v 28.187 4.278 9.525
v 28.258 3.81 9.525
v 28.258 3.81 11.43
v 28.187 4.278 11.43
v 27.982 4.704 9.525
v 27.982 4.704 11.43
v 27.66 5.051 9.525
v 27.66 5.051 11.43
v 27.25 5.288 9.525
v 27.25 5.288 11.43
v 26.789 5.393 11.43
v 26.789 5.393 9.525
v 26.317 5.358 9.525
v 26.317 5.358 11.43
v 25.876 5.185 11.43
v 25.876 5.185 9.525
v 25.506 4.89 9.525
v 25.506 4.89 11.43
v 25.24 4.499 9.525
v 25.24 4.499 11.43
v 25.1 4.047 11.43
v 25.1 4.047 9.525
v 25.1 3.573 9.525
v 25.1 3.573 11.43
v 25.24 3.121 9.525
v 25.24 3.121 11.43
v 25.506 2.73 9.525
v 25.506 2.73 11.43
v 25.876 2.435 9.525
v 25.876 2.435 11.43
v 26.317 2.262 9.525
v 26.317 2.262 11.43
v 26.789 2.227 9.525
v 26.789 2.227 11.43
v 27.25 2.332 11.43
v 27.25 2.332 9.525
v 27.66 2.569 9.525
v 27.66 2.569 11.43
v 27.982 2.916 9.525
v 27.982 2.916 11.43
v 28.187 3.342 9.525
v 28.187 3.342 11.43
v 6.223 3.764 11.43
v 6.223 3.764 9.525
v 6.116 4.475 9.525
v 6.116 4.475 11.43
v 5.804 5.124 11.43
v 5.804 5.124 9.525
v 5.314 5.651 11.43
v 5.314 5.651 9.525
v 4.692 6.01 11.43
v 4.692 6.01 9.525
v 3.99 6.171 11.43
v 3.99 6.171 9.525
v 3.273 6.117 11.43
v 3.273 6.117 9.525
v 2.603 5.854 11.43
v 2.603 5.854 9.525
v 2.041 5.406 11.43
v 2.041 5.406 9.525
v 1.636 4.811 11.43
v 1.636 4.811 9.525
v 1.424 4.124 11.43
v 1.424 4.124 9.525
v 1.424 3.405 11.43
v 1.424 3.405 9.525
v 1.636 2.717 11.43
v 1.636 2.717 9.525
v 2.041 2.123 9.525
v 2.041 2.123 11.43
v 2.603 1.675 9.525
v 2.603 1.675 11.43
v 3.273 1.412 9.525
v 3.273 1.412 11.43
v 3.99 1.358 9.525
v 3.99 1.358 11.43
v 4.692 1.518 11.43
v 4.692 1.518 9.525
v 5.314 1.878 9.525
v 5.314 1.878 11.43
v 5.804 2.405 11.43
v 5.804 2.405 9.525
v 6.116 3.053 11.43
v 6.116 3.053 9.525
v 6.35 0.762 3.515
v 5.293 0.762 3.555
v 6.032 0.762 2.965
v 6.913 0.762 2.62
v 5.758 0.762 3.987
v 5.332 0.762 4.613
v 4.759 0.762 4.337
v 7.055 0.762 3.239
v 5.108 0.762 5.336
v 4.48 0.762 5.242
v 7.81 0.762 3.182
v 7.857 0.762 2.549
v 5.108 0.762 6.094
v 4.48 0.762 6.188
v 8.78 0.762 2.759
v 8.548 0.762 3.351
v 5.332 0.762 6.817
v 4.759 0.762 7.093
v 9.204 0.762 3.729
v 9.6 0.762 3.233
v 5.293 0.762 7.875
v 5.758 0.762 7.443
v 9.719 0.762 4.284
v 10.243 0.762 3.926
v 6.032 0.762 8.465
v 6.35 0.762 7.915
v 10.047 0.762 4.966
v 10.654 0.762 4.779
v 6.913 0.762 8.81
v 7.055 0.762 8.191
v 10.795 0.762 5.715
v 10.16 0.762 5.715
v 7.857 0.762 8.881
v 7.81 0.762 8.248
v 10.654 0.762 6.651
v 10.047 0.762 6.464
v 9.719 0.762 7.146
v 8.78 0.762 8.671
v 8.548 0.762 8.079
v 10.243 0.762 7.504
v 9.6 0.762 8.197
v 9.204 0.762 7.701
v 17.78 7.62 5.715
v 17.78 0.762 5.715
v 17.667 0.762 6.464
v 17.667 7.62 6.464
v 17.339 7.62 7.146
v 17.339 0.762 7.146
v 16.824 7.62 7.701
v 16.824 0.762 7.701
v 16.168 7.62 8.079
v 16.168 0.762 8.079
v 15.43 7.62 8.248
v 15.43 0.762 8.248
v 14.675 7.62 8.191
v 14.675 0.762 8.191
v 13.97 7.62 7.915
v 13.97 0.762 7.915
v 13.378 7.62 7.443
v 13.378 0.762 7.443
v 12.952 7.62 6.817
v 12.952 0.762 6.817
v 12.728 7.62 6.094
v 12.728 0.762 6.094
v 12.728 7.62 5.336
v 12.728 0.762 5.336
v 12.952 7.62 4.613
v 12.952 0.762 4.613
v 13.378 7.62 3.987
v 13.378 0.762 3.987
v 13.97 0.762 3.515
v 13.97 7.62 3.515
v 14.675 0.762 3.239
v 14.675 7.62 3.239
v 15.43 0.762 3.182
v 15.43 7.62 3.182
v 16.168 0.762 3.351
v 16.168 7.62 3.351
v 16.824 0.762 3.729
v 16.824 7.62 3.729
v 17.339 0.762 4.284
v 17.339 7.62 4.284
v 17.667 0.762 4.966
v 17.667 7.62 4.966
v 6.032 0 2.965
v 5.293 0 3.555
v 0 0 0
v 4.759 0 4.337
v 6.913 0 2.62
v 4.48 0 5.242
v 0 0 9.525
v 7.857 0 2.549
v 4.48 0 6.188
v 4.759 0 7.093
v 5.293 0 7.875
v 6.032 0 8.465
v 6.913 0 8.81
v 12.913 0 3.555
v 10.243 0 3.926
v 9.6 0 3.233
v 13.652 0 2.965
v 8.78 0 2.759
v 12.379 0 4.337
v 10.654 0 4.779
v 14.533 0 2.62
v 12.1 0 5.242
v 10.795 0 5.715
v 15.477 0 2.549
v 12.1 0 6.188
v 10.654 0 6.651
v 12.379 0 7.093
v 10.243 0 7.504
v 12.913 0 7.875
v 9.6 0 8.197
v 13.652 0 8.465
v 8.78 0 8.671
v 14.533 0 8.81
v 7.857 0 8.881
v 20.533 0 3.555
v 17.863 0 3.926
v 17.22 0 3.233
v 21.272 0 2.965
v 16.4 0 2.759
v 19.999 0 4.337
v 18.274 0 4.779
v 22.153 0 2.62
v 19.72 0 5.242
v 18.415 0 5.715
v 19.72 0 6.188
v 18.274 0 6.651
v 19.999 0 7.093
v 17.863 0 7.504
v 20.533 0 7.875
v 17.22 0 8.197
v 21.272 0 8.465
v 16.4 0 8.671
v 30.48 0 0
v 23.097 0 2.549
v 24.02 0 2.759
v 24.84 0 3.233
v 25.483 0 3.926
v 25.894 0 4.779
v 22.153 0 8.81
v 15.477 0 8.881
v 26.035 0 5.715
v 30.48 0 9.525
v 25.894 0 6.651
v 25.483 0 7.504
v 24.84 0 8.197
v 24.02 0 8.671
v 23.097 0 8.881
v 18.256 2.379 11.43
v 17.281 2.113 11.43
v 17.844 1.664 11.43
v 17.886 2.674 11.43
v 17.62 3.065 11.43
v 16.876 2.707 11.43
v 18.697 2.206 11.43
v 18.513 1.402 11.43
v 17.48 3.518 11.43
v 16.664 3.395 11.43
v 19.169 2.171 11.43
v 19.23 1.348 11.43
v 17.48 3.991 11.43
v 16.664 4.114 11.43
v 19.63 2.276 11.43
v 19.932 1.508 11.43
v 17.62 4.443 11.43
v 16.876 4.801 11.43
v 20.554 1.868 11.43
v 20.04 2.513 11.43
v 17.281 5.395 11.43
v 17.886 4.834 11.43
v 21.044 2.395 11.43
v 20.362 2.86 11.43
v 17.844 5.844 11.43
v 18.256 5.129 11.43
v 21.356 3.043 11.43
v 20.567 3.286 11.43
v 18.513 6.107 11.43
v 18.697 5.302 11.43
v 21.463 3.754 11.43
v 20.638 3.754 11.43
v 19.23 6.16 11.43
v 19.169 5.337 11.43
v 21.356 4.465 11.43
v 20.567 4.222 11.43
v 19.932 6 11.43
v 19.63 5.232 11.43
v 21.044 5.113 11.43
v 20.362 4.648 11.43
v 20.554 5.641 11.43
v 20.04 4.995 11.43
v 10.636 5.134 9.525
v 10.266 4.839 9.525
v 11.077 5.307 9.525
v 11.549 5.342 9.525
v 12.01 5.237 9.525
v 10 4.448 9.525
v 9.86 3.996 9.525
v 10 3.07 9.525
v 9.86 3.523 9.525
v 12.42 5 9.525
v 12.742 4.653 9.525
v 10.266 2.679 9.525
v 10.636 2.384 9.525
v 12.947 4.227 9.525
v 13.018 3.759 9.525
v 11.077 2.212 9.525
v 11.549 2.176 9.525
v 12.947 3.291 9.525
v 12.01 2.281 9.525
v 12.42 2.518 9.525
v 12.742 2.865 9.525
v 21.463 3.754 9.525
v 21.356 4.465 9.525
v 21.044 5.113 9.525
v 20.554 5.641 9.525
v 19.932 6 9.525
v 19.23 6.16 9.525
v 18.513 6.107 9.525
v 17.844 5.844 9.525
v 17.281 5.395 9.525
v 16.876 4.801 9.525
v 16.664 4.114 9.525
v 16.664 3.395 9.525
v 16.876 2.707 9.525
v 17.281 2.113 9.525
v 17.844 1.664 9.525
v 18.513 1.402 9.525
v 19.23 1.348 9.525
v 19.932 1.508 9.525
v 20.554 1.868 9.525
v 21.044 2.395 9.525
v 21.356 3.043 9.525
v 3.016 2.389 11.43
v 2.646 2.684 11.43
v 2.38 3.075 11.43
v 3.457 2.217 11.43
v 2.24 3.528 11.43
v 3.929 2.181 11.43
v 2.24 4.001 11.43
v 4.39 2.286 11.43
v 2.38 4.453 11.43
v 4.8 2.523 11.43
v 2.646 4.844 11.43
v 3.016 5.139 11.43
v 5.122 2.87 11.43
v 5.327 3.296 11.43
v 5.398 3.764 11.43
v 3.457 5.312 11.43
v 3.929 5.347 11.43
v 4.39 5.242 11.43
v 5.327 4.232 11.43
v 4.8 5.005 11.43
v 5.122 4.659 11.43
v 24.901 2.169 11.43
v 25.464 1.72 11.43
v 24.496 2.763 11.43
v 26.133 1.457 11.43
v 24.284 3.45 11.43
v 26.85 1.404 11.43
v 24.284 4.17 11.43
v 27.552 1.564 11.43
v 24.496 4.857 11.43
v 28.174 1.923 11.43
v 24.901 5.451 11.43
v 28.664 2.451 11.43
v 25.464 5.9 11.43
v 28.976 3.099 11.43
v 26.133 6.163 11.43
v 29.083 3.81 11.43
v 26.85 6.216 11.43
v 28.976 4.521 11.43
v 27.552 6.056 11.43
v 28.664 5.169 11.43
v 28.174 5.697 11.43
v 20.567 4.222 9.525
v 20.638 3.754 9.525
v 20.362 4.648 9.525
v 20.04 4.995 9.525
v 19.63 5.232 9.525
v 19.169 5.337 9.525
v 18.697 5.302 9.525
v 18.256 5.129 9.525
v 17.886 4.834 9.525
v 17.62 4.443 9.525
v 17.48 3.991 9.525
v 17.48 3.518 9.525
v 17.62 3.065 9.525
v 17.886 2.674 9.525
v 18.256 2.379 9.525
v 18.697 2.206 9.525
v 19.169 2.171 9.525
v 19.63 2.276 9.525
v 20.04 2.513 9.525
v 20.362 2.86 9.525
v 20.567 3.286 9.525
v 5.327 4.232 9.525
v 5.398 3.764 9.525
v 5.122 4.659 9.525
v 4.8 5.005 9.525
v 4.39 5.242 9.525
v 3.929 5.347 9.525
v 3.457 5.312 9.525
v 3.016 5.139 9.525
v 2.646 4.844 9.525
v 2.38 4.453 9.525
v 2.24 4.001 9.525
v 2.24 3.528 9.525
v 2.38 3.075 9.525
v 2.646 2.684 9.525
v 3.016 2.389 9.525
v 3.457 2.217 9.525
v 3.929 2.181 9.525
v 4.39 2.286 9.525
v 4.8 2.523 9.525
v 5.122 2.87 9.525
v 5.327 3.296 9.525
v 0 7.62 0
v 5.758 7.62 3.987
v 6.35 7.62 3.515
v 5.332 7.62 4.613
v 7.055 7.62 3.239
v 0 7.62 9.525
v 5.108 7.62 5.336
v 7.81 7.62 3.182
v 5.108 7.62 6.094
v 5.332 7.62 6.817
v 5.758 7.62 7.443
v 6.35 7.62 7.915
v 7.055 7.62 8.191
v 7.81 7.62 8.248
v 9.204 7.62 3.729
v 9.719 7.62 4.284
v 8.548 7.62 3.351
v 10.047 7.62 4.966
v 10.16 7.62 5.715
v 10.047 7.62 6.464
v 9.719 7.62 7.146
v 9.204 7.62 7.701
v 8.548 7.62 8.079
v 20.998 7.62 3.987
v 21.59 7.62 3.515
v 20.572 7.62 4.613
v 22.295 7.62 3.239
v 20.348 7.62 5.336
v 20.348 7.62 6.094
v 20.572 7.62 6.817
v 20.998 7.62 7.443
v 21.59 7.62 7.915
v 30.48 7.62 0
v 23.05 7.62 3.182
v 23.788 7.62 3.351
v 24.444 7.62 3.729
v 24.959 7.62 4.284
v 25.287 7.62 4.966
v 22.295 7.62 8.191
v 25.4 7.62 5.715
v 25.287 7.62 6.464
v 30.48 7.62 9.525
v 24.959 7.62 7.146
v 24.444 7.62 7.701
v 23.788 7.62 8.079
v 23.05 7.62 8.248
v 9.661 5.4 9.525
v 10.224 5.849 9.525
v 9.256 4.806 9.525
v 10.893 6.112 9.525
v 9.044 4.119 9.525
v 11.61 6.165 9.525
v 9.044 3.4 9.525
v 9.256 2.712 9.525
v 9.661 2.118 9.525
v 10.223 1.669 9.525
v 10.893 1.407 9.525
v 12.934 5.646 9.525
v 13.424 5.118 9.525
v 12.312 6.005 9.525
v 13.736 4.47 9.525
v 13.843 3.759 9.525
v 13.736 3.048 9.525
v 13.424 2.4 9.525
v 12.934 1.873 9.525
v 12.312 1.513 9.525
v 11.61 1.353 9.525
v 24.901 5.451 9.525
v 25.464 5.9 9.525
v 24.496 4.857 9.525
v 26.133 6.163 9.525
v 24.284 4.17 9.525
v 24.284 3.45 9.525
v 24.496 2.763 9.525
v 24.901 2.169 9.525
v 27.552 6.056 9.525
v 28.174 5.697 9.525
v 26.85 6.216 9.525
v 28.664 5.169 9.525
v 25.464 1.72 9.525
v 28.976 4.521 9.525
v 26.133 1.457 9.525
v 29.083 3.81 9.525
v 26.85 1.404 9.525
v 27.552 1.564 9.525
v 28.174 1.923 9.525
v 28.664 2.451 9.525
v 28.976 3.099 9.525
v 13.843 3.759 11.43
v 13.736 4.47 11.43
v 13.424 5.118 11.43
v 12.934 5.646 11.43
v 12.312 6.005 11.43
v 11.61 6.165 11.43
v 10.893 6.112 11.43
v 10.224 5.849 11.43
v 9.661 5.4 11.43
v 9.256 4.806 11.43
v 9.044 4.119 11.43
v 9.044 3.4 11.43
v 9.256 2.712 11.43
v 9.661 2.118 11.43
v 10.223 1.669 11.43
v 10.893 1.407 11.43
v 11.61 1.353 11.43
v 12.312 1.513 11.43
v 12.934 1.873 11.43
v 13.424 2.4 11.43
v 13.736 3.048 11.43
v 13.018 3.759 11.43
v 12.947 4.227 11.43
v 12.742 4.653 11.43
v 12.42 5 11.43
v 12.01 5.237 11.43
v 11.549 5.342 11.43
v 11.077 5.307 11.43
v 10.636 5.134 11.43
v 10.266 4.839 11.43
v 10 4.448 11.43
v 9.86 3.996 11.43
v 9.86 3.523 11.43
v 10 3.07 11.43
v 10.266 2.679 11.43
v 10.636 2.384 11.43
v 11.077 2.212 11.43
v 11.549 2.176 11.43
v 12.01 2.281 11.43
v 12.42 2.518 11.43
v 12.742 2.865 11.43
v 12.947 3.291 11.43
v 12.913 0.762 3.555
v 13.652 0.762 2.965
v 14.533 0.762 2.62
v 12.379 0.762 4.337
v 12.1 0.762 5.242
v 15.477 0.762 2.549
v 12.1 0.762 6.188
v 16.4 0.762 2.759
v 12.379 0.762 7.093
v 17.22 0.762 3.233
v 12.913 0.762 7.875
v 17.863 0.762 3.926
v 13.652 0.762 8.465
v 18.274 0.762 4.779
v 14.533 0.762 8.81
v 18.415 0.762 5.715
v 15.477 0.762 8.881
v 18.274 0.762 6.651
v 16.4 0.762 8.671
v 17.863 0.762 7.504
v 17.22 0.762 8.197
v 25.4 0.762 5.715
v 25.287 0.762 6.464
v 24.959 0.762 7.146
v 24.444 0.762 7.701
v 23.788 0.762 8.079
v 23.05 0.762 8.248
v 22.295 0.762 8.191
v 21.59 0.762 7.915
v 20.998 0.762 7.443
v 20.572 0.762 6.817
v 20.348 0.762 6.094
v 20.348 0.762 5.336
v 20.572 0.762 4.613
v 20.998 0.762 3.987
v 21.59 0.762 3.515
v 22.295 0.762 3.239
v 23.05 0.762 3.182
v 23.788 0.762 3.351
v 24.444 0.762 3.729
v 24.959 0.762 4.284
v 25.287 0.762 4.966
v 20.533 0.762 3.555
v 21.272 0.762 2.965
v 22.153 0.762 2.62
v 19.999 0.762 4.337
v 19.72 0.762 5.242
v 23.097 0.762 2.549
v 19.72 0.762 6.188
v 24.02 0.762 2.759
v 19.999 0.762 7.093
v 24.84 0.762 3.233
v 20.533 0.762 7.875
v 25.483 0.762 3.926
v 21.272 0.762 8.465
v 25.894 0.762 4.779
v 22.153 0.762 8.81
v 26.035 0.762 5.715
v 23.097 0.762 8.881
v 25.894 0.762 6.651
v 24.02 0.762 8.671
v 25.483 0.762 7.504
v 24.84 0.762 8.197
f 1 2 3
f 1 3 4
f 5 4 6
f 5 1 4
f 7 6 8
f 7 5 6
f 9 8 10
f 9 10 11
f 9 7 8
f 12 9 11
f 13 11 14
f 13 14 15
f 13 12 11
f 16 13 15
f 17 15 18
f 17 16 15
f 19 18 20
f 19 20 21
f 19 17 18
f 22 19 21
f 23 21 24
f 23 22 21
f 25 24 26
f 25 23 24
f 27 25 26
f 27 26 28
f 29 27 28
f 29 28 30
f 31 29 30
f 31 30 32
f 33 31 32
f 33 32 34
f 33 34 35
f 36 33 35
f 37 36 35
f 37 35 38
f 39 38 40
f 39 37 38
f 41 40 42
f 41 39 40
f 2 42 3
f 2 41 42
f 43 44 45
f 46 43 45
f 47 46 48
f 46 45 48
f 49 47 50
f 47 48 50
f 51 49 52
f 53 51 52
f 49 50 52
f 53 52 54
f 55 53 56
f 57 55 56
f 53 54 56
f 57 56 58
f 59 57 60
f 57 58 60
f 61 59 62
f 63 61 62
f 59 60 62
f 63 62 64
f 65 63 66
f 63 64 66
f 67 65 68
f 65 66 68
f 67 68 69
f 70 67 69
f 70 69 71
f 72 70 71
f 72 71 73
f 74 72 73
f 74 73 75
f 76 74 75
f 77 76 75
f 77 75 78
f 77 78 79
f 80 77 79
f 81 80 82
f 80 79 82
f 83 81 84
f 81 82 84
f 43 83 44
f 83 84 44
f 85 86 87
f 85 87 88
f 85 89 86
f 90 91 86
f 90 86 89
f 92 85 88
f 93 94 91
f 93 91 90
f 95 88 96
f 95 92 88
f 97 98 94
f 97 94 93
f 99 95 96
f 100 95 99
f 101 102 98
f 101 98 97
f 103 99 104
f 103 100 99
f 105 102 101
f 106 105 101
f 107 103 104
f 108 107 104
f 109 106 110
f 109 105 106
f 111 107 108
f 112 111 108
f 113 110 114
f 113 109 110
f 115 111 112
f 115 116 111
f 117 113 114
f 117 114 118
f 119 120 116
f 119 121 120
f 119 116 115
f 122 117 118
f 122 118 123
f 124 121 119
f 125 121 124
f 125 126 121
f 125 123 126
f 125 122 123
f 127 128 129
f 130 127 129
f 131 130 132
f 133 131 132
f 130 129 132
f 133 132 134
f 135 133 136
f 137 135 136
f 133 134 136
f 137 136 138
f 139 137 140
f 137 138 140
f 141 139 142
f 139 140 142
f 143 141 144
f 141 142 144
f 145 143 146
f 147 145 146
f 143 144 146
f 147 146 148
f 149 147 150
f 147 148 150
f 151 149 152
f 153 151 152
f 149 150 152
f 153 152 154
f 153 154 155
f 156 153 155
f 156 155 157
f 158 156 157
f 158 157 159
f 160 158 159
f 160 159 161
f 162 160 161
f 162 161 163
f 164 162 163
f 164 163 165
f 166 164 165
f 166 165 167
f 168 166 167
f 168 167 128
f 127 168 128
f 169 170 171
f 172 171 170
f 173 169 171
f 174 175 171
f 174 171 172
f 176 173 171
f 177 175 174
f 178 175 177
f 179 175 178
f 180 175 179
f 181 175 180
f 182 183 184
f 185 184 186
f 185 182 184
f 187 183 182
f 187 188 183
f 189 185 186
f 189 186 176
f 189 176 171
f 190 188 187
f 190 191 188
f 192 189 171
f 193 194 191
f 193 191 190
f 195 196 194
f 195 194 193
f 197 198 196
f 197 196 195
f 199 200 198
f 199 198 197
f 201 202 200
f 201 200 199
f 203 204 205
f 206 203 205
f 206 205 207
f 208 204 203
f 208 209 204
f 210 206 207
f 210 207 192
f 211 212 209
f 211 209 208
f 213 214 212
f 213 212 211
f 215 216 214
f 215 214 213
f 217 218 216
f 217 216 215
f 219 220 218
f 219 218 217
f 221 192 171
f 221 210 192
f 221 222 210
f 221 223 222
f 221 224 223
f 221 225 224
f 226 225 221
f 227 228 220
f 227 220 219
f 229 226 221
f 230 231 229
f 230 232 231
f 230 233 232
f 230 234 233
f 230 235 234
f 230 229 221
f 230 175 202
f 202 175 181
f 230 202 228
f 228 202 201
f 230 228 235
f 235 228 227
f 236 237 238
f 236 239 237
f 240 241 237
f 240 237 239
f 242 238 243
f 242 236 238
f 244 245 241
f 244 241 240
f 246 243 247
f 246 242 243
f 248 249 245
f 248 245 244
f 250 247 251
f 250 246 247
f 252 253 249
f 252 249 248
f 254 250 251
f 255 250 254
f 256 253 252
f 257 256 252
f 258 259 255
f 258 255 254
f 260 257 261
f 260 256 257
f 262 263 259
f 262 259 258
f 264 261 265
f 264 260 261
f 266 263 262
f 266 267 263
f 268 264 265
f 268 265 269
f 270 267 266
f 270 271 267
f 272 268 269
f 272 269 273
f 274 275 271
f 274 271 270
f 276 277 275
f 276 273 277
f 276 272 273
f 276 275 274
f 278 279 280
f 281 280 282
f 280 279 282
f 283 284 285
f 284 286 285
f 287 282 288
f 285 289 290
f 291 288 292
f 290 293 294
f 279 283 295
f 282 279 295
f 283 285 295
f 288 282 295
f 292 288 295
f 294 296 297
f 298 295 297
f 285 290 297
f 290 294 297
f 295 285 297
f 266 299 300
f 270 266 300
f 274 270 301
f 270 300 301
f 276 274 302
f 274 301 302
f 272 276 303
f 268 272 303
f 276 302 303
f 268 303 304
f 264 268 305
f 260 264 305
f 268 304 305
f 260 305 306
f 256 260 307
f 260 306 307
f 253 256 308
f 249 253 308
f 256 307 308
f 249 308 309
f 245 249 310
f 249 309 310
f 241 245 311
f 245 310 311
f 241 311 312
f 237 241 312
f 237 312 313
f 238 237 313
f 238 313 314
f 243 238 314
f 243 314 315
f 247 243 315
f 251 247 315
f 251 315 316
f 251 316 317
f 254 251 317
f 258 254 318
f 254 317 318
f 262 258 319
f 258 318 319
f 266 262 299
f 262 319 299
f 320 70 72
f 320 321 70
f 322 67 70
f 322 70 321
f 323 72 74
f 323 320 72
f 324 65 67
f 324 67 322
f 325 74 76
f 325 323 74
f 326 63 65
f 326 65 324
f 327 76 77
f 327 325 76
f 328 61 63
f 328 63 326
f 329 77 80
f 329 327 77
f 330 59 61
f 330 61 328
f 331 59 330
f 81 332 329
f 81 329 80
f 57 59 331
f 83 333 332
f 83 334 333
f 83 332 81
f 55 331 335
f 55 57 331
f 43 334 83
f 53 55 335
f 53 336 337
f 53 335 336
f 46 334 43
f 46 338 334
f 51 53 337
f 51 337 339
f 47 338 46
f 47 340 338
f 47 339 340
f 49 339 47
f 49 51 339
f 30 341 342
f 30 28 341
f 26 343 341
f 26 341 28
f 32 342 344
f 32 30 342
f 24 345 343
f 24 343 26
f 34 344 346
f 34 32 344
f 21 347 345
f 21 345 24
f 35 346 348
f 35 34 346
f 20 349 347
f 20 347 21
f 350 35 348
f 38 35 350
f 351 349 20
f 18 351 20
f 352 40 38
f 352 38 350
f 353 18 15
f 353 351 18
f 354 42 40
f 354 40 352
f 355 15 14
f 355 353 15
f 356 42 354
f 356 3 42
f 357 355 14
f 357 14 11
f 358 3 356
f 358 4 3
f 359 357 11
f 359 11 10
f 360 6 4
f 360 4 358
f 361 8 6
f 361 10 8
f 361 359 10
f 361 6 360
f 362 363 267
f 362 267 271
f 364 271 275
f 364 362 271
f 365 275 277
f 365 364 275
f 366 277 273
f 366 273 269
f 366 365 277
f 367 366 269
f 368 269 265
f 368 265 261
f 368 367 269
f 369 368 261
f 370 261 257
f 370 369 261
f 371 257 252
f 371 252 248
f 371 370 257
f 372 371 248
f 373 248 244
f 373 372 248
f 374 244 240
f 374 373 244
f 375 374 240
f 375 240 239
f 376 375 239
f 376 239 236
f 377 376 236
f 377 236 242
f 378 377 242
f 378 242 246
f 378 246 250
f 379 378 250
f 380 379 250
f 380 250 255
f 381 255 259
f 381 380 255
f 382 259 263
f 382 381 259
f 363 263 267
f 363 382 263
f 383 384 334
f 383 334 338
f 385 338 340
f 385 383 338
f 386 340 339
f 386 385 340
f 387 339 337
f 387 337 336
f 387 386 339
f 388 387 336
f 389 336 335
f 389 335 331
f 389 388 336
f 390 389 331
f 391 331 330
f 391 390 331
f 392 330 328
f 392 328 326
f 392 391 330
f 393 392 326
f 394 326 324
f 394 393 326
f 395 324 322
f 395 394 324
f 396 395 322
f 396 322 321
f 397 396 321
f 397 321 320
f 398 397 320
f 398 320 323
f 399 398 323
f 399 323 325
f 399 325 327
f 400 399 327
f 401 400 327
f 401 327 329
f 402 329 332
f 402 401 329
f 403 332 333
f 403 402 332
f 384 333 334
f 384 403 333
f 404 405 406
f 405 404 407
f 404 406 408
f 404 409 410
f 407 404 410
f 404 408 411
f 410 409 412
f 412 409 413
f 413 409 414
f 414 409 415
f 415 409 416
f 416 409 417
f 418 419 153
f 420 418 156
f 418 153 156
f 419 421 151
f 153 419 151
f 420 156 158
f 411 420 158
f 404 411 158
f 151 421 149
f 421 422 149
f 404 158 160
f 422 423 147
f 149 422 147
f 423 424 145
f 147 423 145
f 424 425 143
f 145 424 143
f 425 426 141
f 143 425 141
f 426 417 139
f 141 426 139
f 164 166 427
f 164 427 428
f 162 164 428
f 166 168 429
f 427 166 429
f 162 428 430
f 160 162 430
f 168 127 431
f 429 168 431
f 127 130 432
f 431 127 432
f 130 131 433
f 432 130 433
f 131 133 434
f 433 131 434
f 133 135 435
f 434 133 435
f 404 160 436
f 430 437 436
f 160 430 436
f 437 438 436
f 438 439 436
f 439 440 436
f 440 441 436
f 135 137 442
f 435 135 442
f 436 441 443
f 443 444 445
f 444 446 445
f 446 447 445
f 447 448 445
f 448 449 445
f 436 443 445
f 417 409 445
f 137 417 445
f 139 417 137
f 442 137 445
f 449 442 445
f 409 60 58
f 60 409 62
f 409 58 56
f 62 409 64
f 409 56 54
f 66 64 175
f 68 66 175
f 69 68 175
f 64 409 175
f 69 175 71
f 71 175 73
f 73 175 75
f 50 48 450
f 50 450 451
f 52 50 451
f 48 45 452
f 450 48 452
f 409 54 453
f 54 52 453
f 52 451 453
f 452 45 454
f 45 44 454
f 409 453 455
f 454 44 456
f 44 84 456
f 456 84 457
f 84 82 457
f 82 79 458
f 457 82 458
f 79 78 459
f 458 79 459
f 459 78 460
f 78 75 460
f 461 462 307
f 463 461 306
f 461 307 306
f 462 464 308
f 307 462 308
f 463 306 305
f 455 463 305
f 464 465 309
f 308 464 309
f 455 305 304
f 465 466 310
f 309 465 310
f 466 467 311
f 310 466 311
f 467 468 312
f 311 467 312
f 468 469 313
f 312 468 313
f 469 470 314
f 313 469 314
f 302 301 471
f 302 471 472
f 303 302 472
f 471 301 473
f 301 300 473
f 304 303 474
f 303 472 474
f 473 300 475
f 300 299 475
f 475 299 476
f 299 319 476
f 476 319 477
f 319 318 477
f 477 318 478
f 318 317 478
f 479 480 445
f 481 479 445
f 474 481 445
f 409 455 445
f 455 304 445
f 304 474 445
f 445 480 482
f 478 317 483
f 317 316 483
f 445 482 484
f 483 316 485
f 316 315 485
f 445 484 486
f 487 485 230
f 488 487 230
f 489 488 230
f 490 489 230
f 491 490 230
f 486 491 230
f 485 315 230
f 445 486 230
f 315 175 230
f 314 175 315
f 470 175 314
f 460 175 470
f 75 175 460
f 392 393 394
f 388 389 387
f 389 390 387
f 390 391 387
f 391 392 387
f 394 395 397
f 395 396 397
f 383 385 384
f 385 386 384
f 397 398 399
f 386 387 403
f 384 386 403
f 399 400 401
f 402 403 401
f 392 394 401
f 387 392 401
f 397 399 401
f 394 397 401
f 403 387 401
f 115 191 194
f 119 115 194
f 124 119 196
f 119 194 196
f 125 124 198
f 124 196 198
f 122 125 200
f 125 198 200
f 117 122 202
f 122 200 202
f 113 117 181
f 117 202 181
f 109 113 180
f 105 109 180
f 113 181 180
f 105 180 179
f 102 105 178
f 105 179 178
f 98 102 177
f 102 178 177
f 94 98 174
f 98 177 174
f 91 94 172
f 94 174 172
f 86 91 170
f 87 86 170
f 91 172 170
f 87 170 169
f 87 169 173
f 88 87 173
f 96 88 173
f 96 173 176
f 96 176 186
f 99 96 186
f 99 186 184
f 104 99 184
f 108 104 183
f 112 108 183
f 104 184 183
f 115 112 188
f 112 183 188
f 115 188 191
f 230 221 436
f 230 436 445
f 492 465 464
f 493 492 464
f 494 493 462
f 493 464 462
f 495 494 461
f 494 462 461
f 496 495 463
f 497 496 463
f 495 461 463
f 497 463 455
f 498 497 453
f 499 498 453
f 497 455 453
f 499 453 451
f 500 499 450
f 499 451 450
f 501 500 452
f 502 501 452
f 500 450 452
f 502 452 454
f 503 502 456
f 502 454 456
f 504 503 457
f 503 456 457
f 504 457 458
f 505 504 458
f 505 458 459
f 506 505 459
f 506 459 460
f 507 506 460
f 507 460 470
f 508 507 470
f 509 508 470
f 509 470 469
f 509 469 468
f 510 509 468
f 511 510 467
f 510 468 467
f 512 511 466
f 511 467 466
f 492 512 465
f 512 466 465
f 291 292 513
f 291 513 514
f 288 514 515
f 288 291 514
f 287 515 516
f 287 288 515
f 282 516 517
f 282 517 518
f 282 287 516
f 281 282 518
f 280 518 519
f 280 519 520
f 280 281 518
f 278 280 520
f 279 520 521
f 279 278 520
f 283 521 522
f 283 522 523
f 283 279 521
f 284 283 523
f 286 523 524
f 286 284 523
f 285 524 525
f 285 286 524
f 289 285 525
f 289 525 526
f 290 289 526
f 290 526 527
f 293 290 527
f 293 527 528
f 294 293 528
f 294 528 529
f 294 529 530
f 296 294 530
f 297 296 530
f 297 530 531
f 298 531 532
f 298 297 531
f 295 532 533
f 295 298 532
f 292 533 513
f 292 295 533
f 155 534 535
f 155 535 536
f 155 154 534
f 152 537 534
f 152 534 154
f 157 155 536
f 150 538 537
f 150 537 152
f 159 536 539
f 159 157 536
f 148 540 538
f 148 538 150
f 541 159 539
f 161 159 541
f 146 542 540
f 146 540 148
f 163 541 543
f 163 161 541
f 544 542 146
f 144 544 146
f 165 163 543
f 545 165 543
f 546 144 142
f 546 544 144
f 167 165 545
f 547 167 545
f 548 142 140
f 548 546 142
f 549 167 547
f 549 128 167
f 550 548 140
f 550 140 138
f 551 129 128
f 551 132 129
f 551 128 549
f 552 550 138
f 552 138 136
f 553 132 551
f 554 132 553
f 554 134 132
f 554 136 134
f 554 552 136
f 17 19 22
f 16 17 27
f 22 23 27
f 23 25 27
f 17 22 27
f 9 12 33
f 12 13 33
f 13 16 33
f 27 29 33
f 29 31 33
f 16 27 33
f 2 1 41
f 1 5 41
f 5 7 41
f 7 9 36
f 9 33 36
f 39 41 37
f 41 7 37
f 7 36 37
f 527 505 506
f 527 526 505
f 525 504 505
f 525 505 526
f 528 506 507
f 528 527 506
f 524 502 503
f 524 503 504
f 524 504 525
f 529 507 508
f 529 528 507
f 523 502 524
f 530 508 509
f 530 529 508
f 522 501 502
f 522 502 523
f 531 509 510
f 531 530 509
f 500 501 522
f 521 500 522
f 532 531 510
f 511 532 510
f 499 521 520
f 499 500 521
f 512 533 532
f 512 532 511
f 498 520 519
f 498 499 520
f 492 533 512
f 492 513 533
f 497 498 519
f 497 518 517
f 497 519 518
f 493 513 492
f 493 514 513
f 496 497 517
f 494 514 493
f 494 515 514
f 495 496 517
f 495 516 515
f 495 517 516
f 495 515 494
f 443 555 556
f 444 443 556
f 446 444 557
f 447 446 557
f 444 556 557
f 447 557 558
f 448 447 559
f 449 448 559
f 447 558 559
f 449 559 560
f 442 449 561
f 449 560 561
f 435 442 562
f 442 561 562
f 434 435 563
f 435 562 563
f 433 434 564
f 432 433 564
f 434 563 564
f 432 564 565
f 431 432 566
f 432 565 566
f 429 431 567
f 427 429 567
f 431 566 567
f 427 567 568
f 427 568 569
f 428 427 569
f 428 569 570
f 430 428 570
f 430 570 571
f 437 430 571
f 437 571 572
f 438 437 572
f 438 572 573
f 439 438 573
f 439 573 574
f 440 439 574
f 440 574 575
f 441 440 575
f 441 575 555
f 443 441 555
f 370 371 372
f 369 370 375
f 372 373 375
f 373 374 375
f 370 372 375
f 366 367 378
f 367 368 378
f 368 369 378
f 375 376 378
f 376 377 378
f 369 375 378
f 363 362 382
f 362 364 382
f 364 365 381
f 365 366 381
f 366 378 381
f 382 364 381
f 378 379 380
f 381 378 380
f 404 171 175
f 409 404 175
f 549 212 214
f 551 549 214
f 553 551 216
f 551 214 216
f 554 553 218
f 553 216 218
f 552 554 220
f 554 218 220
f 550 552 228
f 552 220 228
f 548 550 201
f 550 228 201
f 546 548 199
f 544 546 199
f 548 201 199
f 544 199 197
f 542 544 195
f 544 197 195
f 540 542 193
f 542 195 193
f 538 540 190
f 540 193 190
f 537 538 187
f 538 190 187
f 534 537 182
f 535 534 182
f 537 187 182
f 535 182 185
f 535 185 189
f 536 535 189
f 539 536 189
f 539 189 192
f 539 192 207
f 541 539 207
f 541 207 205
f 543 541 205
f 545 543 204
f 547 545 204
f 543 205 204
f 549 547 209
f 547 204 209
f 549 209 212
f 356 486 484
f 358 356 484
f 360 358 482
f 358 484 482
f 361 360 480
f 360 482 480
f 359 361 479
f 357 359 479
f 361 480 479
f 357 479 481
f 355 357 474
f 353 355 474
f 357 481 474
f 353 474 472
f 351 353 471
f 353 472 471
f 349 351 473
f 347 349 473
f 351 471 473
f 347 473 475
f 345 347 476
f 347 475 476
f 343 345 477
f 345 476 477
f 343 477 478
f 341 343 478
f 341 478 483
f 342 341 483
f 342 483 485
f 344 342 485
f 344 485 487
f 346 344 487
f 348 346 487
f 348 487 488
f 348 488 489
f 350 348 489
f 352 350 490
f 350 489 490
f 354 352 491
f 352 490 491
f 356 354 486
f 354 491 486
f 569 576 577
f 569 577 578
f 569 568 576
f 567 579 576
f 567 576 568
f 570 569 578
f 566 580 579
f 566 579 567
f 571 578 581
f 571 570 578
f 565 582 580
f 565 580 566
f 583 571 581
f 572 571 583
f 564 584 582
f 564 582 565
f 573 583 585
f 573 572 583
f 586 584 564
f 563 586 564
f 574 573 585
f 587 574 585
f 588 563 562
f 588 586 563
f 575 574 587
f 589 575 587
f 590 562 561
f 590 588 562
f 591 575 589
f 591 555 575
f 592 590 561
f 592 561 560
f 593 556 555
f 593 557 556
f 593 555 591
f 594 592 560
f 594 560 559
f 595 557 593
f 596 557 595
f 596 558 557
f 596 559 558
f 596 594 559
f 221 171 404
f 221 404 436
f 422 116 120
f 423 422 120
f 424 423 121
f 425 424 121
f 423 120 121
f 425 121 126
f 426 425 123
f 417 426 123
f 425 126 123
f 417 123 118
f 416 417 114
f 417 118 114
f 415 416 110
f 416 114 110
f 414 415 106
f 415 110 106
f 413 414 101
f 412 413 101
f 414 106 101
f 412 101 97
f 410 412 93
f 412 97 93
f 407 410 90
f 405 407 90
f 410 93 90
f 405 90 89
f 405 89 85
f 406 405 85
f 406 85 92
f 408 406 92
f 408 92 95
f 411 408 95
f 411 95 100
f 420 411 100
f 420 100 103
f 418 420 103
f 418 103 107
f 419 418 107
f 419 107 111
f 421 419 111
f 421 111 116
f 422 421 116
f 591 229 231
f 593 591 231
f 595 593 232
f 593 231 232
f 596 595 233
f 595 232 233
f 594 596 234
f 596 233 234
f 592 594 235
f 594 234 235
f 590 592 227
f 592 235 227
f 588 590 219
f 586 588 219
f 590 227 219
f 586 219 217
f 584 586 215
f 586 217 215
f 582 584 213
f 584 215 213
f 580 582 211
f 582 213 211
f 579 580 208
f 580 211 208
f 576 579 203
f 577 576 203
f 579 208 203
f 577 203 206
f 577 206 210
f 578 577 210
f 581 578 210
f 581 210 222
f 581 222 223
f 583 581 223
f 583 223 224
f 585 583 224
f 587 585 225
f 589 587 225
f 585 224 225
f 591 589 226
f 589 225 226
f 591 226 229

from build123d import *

# Parameters (mm, degrees)
F0_W     = 30.48
F0_H     = 9.525
F1_DEPTH = 7.62
F2_R     = 3.175
F2_R_2   = 2.54
F3_DEPTH = 0.762
F4_DEPTH = 10.16
F5_R     = 2.413
F5_R_2   = 1.5875
F6_DEPTH = 1.905


with BuildPart() as f1:
    # F0 (on Front) → F1 (new body)
    with BuildSketch(Plane.XZ):
        with Locations((15.24, 4.7625)):
            Rectangle(F0_W, F0_H)
    extrude(amount=-F1_DEPTH)

    # F2 (on face) → F3 (cut)
    with BuildSketch(Plane.XZ):
        with Locations((7.62, 5.715)):
            Circle(F2_R)
        with Locations((7.62, 5.715)):
            Circle(F2_R_2, mode=Mode.SUBTRACT)
        with Locations((15.24, 5.715)):
            Circle(F2_R)
        with Locations((15.24, 5.715)):
            Circle(F2_R_2, mode=Mode.SUBTRACT)
        with Locations((22.86, 5.715)):
            Circle(F2_R)
        with Locations((22.86, 5.715)):
            Circle(F2_R_2, mode=Mode.SUBTRACT)
    extrude(amount=-F3_DEPTH, mode=Mode.SUBTRACT)

    # F4 (cut): faces of the model
    f4_faces = [f1.faces().sort_by_distance(p)[0] for p in [
        (7.62, 0, 5.715),
        (15.24, 0, 5.715),
        (22.86, 0, 5.715),
    ]]
    extrude(f4_faces, amount=-F4_DEPTH, mode=Mode.SUBTRACT)

    # F5 (on face) → F6 (join)
    with BuildSketch(Plane.XY.offset(9.525)):
        with Locations((3.81, 3.7642538082)):
            Circle(F5_R)
        with Locations((3.81, 3.7642538082)):
            Circle(F5_R_2, mode=Mode.SUBTRACT)
        with Locations((11.43, 3.7592)):
            Circle(F5_R)
        with Locations((11.43, 3.7592)):
            Circle(F5_R_2, mode=Mode.SUBTRACT)
        with Locations((19.05, 3.7541461918)):
            Circle(F5_R)
        with Locations((19.05, 3.7541461918)):
            Circle(F5_R_2, mode=Mode.SUBTRACT)
        with Locations((26.67, 3.81)):
            Circle(F5_R)
        with Locations((26.67, 3.81)):
            Circle(F5_R_2, mode=Mode.SUBTRACT)
    extrude(amount=F6_DEPTH)


solid = f1.part
